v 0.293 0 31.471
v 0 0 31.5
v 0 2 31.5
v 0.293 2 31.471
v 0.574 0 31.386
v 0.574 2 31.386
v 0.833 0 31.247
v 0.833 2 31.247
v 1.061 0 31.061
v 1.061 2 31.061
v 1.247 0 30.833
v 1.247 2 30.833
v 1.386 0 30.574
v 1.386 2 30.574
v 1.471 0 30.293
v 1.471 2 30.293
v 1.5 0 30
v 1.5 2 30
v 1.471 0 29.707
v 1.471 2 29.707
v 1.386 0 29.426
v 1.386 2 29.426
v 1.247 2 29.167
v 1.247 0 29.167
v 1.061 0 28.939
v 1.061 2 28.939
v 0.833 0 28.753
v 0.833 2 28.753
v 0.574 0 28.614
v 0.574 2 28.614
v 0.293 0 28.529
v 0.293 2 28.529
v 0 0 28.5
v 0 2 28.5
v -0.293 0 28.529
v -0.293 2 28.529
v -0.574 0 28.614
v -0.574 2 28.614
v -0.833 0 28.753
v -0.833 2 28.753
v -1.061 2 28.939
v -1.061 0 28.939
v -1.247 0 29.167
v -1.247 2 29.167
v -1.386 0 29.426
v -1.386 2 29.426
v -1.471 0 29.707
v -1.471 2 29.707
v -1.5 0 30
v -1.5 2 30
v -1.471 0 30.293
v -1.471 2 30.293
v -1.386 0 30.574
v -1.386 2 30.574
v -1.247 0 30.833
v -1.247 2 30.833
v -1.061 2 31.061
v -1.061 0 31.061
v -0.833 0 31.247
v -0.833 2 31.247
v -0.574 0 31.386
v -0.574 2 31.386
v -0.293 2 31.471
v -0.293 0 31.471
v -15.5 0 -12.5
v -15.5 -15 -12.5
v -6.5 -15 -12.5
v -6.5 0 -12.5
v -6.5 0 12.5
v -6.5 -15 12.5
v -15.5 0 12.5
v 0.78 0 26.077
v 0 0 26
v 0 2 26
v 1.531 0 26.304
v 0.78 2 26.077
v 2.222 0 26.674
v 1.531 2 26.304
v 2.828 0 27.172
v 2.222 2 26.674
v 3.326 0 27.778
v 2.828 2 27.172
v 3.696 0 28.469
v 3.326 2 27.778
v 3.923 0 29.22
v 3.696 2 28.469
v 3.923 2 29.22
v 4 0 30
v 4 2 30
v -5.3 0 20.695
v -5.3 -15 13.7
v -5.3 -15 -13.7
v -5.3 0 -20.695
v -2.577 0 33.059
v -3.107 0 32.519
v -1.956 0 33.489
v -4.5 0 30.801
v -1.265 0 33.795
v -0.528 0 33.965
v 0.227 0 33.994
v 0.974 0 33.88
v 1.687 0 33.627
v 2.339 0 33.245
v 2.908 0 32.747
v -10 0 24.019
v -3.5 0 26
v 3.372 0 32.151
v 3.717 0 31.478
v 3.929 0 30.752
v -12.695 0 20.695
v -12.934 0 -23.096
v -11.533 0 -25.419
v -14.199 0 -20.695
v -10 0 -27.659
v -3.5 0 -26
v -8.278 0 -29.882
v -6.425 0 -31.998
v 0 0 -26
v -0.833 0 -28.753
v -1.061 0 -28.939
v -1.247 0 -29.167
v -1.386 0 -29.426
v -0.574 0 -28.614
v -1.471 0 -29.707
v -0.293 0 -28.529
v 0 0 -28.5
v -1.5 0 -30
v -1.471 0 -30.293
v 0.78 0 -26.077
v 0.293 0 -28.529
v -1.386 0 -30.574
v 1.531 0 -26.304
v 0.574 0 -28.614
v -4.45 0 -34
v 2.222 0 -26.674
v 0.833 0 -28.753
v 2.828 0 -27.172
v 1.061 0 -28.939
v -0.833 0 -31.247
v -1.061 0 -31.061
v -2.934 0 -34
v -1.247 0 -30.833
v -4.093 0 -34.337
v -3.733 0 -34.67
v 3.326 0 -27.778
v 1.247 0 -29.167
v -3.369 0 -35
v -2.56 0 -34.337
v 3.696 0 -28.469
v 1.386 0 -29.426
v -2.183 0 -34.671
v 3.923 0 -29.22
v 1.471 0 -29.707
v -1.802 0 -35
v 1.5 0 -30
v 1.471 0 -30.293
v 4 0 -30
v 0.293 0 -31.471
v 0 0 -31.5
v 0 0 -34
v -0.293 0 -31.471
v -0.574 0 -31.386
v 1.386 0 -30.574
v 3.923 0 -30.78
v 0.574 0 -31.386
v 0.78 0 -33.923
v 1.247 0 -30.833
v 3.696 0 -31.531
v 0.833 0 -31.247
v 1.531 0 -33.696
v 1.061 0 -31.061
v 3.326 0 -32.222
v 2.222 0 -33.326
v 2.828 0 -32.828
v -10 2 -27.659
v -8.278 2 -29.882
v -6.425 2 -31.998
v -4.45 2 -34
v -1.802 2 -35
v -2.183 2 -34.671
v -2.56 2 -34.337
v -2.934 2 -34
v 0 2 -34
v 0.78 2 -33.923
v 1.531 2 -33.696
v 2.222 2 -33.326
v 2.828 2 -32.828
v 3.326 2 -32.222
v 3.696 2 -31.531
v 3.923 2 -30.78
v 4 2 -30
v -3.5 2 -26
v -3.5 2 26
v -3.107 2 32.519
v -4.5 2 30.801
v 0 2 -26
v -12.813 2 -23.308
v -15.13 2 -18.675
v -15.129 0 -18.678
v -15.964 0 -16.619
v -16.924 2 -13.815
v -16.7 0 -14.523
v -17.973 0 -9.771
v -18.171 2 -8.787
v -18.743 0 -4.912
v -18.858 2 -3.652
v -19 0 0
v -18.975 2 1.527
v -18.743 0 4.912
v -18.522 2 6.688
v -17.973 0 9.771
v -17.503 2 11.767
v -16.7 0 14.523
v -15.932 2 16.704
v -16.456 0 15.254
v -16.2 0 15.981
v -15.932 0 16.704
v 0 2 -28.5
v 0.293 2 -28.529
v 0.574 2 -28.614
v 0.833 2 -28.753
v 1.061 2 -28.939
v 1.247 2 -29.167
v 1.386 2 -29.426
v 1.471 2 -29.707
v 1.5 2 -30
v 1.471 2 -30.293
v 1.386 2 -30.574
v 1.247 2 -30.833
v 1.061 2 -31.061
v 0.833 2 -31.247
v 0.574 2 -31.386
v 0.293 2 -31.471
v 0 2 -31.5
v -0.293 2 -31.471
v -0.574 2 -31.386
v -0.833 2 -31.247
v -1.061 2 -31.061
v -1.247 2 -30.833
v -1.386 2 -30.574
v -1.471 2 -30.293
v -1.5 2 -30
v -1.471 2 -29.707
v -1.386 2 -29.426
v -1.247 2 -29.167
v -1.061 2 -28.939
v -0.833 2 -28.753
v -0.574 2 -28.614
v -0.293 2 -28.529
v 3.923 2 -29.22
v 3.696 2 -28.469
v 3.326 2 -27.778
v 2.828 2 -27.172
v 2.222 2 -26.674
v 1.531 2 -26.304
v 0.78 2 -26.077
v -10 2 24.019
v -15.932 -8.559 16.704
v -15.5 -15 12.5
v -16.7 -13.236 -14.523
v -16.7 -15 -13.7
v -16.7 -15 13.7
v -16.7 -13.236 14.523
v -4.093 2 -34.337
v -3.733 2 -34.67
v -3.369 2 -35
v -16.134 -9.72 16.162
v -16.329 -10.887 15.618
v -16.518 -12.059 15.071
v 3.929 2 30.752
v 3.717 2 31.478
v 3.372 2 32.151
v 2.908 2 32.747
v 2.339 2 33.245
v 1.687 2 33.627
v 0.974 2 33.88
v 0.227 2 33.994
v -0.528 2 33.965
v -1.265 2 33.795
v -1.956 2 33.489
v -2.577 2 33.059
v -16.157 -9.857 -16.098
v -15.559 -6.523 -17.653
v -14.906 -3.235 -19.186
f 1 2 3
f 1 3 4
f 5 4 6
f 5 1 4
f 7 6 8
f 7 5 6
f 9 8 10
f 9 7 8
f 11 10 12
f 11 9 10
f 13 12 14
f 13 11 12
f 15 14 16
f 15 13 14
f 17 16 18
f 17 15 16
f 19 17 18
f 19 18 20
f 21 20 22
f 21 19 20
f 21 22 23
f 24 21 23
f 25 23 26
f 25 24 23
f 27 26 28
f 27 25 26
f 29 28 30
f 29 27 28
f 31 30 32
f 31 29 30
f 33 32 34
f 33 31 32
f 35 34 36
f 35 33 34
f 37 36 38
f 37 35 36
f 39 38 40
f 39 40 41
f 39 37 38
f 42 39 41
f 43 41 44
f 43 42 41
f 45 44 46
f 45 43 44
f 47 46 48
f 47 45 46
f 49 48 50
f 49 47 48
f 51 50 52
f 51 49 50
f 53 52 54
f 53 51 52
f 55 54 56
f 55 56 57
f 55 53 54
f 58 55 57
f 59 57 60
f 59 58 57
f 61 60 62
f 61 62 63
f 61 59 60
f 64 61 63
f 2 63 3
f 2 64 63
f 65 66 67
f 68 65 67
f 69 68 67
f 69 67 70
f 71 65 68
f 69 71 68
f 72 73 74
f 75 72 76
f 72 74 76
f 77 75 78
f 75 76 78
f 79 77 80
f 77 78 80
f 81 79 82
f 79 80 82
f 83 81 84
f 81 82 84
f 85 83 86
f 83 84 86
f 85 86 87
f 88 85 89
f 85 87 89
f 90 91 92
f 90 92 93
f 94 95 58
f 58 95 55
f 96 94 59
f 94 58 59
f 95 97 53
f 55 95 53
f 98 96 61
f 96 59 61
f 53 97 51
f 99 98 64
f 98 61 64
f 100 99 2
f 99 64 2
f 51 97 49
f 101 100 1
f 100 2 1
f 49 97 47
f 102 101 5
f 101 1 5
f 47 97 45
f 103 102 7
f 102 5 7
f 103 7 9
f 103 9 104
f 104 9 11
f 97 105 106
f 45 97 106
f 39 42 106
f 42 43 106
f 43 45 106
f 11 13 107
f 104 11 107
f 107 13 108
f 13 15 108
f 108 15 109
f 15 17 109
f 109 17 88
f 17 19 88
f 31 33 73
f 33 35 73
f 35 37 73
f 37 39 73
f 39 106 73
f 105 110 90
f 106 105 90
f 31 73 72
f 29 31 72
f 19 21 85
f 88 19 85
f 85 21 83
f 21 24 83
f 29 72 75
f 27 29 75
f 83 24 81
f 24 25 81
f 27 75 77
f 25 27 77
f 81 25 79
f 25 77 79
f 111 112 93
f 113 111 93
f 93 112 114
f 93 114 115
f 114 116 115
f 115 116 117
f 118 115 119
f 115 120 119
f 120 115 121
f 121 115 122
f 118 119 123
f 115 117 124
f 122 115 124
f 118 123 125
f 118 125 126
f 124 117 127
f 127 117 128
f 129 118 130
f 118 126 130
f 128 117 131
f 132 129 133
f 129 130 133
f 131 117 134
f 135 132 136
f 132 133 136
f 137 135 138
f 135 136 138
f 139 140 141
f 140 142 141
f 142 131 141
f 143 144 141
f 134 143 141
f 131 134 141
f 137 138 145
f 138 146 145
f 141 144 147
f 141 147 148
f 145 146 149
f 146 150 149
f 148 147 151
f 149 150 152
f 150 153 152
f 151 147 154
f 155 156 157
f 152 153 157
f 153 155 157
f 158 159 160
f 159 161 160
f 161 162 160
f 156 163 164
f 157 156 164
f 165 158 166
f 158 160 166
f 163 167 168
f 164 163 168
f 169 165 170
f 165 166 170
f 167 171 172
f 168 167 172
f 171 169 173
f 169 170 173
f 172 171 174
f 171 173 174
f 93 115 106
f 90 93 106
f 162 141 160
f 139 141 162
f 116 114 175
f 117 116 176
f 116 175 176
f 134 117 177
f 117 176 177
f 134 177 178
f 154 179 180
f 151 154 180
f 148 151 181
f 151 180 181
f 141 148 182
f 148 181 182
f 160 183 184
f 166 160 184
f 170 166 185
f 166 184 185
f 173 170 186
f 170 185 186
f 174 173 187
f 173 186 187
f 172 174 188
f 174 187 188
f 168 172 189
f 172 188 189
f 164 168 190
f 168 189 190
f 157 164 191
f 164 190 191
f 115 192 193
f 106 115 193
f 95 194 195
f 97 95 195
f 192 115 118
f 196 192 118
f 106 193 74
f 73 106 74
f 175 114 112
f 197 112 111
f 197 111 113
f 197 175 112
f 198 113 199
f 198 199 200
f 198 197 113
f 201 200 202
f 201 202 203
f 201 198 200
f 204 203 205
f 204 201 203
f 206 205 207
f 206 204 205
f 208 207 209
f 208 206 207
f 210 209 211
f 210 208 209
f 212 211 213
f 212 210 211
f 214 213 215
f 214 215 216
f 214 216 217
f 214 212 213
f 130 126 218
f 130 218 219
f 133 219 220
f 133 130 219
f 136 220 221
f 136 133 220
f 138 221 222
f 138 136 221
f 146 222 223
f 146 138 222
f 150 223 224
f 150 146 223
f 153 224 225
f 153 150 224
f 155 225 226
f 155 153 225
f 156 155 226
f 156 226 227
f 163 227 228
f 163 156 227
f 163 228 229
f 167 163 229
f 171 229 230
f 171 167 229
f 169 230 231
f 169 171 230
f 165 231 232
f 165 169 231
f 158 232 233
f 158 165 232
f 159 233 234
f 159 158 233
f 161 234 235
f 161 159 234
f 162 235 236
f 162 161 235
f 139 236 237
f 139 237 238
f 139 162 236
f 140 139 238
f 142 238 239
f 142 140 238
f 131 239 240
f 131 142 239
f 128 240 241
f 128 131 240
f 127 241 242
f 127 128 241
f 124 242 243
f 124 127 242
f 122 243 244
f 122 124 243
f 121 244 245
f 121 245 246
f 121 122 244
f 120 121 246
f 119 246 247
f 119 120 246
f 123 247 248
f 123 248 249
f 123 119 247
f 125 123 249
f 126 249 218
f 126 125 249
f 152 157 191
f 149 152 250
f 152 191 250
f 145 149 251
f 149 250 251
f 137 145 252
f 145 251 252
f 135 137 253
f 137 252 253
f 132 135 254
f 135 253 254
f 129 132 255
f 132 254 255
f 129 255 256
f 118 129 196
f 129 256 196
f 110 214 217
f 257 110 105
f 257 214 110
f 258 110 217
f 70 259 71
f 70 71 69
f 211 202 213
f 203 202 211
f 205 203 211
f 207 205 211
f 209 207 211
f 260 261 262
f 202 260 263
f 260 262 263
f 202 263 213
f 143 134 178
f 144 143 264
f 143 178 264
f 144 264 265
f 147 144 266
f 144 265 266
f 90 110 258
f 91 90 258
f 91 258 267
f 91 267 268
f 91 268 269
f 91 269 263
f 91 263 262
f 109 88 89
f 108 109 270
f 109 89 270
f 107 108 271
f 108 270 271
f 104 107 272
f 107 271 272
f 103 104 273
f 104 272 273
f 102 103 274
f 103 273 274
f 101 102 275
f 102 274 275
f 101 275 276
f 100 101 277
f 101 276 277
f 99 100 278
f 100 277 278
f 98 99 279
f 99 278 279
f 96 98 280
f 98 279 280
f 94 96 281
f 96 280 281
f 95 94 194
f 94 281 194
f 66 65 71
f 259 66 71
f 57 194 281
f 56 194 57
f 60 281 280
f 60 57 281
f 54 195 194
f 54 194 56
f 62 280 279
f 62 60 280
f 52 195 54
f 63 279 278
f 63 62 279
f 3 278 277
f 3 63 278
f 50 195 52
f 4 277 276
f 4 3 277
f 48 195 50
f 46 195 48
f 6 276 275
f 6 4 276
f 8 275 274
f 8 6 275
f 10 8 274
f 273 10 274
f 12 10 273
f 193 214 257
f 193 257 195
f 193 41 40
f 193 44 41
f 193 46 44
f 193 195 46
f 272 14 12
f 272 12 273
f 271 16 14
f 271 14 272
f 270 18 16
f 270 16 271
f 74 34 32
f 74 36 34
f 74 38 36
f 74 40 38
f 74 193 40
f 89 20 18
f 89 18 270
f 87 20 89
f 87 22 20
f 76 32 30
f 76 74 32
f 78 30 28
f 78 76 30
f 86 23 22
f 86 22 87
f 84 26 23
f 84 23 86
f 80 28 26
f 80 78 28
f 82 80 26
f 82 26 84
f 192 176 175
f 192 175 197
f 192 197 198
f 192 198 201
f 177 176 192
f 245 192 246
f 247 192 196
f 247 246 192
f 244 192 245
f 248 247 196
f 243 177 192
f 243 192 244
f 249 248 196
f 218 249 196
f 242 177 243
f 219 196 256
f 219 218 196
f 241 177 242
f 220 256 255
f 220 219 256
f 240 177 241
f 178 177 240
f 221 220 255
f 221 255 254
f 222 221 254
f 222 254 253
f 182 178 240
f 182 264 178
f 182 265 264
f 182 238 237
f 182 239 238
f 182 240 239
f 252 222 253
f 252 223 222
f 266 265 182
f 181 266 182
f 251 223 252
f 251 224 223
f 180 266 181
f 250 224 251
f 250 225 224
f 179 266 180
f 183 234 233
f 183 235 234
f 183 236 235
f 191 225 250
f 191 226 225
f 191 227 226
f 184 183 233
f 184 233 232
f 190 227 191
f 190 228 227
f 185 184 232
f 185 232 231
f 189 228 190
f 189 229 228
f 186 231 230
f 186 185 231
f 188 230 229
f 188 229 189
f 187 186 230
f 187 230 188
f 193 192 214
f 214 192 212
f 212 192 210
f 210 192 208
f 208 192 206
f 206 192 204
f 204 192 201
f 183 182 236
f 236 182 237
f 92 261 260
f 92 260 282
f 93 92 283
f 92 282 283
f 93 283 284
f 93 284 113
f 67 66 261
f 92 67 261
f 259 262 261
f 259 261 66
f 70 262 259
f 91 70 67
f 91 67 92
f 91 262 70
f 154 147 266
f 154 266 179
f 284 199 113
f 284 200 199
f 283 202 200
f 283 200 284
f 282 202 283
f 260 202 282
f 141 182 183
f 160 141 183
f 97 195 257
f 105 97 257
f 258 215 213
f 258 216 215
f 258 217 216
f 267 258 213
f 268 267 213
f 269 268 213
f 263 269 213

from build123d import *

# Parameters (mm, degrees)
SKETCH_1_W          = 20
SKETCH_1_H          = 70
SKETCH_1_R          = 1.5
SKETCH_1_W_2        = 6
SKETCH_1_H_2        = 52
EXTRUDE_1_DEPTH     = 2
SKETCH_2_W          = 0.5
SKETCH_2_H          = 26
CUT_EXTRUDE_1_DEPTH = 37.455452267
EXTRUDE_3_DEPTH     = 2
SKETCH_4_W          = 11.4
SKETCH_4_H          = 27.4
SKETCH_4_W_2        = 9
SKETCH_4_H_2        = 25
EXTRUDE_4_DEPTH     = 15
DRAFT_START         = -16.7
DRAFT_1_DEPTH       = 11.4
DRAFT_START_2       = -13.235626686
DRAFT_1_2_DEPTH     = 13.235626686


with BuildPart() as part:
    # Эскиз1 → Бобышка-Вытянуть1 (new body)
    with BuildSketch(Plane(origin=(0, 0, 0), x_dir=(1, 0, 0), z_dir=(0, 1, 0))):
        Rectangle(SKETCH_1_W, SKETCH_1_H)
        with Locations(Location((0, 30, 0), (0, 0, 270))):
            Circle(SKETCH_1_R, mode=Mode.SUBTRACT)
        with Locations(Location((0, -30, 0), (0, 0, 270))):
            Circle(SKETCH_1_R, mode=Mode.SUBTRACT)
        Rectangle(SKETCH_1_W_2, SKETCH_1_H_2, mode=Mode.SUBTRACT)
    extrude(amount=EXTRUDE_1_DEPTH)

    # Эскиз2 → Вырез-Вытянуть1 (cut, through all)
    with BuildSketch(Plane(origin=(0, 2, 0), x_dir=(1, 0, 0), z_dir=(0, 1, 0))):
        with Locations((-3.25, -13)):
            Rectangle(SKETCH_2_W, SKETCH_2_H)
        with Locations((-3.25, 13)):
            Rectangle(SKETCH_2_W, SKETCH_2_H)
        with BuildLine():
            ThreePointArc((4, 30), (2.828427125, 27.171572875), (0, 26))
            Line((0, 26), (3, 26))
            Line((3, 26), (3, 0))
            Line((3, 0), (10, 0))
            Line((10, 0), (10, 35))
            Line((10, 35), (-1.801814511, 35))
            ThreePointArc((-1.801814511, 35), (-2.371833534, 34.50465844), (-2.933620688, 34))
            Line((-2.933620688, 34), (0, 34))
            ThreePointArc((0, 34), (2.828427125, 32.828427125), (4, 30))
        make_face()
        with BuildLine():
            ThreePointArc((-10, 27.658633372), (-7.367393186, 30.953957731), (-4.449961479, 34))
            ThreePointArc((-4.449961479, 34), (-3.913284985, 34.504235123), (-3.368774283, 35))
            Line((-3.368774283, 35), (-10, 35))
            Line((-10, 35), (-10, 27.658633372))
        make_face()
        with BuildLine():
            Line((10, 0), (3, 0))
            Line((3, 0), (3, -26))
            Line((3, -26), (0, -26))
            ThreePointArc((0, -26), (2.828427125, -27.171572875), (4, -30))
            ThreePointArc((4, -30), (1.336481718, -33.770121565), (-3.106908308, -32.519349274))
            Line((-3.106908308, -32.519349274), (-4.5, -30.80136273))
            Line((-4.5, -30.80136273), (-4.5, -32.5))
            ThreePointArc((-4.5, -32.5), (-3.175976694, -33.777056798), (-1.801814511, -35))
            Line((-1.801814511, -35), (10, -35))
            Line((10, -35), (10, 0))
        make_face()
        with BuildLine():
            Line((-4.5, -32.5), (-4.5, -30.80136273))
            Line((-4.5, -30.80136273), (-10, -24.018660595))
            Line((-10, -24.018660595), (-10, -35))
            Line((-10, -35), (-1.801814511, -35))
            ThreePointArc((-1.801814511, -35), (-3.175976694, -33.777056798), (-4.5, -32.5))
        make_face()
    extrude(amount=-CUT_EXTRUDE_1_DEPTH, mode=Mode.SUBTRACT)

    # Эскиз3 → Бобышка-Вытянуть3 (add)
    with BuildSketch(Plane(origin=(0, 2, 0), x_dir=(1, 0, 0), z_dir=(0, 1, 0))):
        with BuildLine():
            Line((-15.931618932, -16.703677979), (-10, -24.018660595))
            Line((-10, -24.018660595), (-10, 27.658633372))
            ThreePointArc((-10, 27.658633372), (-18.585418451, 6.228867289), (-15.931618932, -16.703677979))
        make_face()
    extrude(amount=-EXTRUDE_3_DEPTH)

    # Эскиз4 → Бобышка-Вытянуть4 (add)
    with BuildSketch(Plane.XZ):
        with Locations((-11, 0)):
            Rectangle(SKETCH_4_W, SKETCH_4_H)
        with Locations((-11, 0)):
            Rectangle(SKETCH_4_W_2, SKETCH_4_H_2, mode=Mode.SUBTRACT)
    extrude(amount=EXTRUDE_4_DEPTH)

    # Уклон1: read off the stored shape, not the designer's step
    # Уклон1 outline → Уклон1 (add)
    with BuildSketch(Plane.YZ.offset(DRAFT_START)):
        Polygon((0, 13.7), (0, 20.694614872), (-15, 13.7), align=None)
        Polygon((0, -20.694614872), (0, -13.7), (-15, -13.7), align=None)
    extrude(amount=DRAFT_1_DEPTH)

    # Draft 1 2 outline → Draft 1 2 (cut)
    with BuildSketch(Plane(origin=(0, 0, 0), x_dir=(1, 0, 0), z_dir=(0, 1, 0)).offset(DRAFT_START_2)):
        with BuildLine():
            Line((-11.63690415, -22), (-15.931618932, -16.703677979))
            ThreePointArc((-15.931618932, -16.703677979), (-16.329223887, -15.617935511), (-16.7, -14.522740789))
            Line((-16.7, -14.522740789), (-16.7, -22))
            Line((-16.7, -22), (-11.63690415, -22))
        make_face()
        with BuildLine():
            Line((-16.7, 22), (-16.7, 14.522740788))
            ThreePointArc((-16.7, 14.522740788), (-15.2783441, 18.329891761), (-13.533119315, 22))
            Line((-13.533119315, 22), (-16.7, 22))
        make_face()
    extrude(amount=DRAFT_1_2_DEPTH, mode=Mode.SUBTRACT)


solid = part.part
